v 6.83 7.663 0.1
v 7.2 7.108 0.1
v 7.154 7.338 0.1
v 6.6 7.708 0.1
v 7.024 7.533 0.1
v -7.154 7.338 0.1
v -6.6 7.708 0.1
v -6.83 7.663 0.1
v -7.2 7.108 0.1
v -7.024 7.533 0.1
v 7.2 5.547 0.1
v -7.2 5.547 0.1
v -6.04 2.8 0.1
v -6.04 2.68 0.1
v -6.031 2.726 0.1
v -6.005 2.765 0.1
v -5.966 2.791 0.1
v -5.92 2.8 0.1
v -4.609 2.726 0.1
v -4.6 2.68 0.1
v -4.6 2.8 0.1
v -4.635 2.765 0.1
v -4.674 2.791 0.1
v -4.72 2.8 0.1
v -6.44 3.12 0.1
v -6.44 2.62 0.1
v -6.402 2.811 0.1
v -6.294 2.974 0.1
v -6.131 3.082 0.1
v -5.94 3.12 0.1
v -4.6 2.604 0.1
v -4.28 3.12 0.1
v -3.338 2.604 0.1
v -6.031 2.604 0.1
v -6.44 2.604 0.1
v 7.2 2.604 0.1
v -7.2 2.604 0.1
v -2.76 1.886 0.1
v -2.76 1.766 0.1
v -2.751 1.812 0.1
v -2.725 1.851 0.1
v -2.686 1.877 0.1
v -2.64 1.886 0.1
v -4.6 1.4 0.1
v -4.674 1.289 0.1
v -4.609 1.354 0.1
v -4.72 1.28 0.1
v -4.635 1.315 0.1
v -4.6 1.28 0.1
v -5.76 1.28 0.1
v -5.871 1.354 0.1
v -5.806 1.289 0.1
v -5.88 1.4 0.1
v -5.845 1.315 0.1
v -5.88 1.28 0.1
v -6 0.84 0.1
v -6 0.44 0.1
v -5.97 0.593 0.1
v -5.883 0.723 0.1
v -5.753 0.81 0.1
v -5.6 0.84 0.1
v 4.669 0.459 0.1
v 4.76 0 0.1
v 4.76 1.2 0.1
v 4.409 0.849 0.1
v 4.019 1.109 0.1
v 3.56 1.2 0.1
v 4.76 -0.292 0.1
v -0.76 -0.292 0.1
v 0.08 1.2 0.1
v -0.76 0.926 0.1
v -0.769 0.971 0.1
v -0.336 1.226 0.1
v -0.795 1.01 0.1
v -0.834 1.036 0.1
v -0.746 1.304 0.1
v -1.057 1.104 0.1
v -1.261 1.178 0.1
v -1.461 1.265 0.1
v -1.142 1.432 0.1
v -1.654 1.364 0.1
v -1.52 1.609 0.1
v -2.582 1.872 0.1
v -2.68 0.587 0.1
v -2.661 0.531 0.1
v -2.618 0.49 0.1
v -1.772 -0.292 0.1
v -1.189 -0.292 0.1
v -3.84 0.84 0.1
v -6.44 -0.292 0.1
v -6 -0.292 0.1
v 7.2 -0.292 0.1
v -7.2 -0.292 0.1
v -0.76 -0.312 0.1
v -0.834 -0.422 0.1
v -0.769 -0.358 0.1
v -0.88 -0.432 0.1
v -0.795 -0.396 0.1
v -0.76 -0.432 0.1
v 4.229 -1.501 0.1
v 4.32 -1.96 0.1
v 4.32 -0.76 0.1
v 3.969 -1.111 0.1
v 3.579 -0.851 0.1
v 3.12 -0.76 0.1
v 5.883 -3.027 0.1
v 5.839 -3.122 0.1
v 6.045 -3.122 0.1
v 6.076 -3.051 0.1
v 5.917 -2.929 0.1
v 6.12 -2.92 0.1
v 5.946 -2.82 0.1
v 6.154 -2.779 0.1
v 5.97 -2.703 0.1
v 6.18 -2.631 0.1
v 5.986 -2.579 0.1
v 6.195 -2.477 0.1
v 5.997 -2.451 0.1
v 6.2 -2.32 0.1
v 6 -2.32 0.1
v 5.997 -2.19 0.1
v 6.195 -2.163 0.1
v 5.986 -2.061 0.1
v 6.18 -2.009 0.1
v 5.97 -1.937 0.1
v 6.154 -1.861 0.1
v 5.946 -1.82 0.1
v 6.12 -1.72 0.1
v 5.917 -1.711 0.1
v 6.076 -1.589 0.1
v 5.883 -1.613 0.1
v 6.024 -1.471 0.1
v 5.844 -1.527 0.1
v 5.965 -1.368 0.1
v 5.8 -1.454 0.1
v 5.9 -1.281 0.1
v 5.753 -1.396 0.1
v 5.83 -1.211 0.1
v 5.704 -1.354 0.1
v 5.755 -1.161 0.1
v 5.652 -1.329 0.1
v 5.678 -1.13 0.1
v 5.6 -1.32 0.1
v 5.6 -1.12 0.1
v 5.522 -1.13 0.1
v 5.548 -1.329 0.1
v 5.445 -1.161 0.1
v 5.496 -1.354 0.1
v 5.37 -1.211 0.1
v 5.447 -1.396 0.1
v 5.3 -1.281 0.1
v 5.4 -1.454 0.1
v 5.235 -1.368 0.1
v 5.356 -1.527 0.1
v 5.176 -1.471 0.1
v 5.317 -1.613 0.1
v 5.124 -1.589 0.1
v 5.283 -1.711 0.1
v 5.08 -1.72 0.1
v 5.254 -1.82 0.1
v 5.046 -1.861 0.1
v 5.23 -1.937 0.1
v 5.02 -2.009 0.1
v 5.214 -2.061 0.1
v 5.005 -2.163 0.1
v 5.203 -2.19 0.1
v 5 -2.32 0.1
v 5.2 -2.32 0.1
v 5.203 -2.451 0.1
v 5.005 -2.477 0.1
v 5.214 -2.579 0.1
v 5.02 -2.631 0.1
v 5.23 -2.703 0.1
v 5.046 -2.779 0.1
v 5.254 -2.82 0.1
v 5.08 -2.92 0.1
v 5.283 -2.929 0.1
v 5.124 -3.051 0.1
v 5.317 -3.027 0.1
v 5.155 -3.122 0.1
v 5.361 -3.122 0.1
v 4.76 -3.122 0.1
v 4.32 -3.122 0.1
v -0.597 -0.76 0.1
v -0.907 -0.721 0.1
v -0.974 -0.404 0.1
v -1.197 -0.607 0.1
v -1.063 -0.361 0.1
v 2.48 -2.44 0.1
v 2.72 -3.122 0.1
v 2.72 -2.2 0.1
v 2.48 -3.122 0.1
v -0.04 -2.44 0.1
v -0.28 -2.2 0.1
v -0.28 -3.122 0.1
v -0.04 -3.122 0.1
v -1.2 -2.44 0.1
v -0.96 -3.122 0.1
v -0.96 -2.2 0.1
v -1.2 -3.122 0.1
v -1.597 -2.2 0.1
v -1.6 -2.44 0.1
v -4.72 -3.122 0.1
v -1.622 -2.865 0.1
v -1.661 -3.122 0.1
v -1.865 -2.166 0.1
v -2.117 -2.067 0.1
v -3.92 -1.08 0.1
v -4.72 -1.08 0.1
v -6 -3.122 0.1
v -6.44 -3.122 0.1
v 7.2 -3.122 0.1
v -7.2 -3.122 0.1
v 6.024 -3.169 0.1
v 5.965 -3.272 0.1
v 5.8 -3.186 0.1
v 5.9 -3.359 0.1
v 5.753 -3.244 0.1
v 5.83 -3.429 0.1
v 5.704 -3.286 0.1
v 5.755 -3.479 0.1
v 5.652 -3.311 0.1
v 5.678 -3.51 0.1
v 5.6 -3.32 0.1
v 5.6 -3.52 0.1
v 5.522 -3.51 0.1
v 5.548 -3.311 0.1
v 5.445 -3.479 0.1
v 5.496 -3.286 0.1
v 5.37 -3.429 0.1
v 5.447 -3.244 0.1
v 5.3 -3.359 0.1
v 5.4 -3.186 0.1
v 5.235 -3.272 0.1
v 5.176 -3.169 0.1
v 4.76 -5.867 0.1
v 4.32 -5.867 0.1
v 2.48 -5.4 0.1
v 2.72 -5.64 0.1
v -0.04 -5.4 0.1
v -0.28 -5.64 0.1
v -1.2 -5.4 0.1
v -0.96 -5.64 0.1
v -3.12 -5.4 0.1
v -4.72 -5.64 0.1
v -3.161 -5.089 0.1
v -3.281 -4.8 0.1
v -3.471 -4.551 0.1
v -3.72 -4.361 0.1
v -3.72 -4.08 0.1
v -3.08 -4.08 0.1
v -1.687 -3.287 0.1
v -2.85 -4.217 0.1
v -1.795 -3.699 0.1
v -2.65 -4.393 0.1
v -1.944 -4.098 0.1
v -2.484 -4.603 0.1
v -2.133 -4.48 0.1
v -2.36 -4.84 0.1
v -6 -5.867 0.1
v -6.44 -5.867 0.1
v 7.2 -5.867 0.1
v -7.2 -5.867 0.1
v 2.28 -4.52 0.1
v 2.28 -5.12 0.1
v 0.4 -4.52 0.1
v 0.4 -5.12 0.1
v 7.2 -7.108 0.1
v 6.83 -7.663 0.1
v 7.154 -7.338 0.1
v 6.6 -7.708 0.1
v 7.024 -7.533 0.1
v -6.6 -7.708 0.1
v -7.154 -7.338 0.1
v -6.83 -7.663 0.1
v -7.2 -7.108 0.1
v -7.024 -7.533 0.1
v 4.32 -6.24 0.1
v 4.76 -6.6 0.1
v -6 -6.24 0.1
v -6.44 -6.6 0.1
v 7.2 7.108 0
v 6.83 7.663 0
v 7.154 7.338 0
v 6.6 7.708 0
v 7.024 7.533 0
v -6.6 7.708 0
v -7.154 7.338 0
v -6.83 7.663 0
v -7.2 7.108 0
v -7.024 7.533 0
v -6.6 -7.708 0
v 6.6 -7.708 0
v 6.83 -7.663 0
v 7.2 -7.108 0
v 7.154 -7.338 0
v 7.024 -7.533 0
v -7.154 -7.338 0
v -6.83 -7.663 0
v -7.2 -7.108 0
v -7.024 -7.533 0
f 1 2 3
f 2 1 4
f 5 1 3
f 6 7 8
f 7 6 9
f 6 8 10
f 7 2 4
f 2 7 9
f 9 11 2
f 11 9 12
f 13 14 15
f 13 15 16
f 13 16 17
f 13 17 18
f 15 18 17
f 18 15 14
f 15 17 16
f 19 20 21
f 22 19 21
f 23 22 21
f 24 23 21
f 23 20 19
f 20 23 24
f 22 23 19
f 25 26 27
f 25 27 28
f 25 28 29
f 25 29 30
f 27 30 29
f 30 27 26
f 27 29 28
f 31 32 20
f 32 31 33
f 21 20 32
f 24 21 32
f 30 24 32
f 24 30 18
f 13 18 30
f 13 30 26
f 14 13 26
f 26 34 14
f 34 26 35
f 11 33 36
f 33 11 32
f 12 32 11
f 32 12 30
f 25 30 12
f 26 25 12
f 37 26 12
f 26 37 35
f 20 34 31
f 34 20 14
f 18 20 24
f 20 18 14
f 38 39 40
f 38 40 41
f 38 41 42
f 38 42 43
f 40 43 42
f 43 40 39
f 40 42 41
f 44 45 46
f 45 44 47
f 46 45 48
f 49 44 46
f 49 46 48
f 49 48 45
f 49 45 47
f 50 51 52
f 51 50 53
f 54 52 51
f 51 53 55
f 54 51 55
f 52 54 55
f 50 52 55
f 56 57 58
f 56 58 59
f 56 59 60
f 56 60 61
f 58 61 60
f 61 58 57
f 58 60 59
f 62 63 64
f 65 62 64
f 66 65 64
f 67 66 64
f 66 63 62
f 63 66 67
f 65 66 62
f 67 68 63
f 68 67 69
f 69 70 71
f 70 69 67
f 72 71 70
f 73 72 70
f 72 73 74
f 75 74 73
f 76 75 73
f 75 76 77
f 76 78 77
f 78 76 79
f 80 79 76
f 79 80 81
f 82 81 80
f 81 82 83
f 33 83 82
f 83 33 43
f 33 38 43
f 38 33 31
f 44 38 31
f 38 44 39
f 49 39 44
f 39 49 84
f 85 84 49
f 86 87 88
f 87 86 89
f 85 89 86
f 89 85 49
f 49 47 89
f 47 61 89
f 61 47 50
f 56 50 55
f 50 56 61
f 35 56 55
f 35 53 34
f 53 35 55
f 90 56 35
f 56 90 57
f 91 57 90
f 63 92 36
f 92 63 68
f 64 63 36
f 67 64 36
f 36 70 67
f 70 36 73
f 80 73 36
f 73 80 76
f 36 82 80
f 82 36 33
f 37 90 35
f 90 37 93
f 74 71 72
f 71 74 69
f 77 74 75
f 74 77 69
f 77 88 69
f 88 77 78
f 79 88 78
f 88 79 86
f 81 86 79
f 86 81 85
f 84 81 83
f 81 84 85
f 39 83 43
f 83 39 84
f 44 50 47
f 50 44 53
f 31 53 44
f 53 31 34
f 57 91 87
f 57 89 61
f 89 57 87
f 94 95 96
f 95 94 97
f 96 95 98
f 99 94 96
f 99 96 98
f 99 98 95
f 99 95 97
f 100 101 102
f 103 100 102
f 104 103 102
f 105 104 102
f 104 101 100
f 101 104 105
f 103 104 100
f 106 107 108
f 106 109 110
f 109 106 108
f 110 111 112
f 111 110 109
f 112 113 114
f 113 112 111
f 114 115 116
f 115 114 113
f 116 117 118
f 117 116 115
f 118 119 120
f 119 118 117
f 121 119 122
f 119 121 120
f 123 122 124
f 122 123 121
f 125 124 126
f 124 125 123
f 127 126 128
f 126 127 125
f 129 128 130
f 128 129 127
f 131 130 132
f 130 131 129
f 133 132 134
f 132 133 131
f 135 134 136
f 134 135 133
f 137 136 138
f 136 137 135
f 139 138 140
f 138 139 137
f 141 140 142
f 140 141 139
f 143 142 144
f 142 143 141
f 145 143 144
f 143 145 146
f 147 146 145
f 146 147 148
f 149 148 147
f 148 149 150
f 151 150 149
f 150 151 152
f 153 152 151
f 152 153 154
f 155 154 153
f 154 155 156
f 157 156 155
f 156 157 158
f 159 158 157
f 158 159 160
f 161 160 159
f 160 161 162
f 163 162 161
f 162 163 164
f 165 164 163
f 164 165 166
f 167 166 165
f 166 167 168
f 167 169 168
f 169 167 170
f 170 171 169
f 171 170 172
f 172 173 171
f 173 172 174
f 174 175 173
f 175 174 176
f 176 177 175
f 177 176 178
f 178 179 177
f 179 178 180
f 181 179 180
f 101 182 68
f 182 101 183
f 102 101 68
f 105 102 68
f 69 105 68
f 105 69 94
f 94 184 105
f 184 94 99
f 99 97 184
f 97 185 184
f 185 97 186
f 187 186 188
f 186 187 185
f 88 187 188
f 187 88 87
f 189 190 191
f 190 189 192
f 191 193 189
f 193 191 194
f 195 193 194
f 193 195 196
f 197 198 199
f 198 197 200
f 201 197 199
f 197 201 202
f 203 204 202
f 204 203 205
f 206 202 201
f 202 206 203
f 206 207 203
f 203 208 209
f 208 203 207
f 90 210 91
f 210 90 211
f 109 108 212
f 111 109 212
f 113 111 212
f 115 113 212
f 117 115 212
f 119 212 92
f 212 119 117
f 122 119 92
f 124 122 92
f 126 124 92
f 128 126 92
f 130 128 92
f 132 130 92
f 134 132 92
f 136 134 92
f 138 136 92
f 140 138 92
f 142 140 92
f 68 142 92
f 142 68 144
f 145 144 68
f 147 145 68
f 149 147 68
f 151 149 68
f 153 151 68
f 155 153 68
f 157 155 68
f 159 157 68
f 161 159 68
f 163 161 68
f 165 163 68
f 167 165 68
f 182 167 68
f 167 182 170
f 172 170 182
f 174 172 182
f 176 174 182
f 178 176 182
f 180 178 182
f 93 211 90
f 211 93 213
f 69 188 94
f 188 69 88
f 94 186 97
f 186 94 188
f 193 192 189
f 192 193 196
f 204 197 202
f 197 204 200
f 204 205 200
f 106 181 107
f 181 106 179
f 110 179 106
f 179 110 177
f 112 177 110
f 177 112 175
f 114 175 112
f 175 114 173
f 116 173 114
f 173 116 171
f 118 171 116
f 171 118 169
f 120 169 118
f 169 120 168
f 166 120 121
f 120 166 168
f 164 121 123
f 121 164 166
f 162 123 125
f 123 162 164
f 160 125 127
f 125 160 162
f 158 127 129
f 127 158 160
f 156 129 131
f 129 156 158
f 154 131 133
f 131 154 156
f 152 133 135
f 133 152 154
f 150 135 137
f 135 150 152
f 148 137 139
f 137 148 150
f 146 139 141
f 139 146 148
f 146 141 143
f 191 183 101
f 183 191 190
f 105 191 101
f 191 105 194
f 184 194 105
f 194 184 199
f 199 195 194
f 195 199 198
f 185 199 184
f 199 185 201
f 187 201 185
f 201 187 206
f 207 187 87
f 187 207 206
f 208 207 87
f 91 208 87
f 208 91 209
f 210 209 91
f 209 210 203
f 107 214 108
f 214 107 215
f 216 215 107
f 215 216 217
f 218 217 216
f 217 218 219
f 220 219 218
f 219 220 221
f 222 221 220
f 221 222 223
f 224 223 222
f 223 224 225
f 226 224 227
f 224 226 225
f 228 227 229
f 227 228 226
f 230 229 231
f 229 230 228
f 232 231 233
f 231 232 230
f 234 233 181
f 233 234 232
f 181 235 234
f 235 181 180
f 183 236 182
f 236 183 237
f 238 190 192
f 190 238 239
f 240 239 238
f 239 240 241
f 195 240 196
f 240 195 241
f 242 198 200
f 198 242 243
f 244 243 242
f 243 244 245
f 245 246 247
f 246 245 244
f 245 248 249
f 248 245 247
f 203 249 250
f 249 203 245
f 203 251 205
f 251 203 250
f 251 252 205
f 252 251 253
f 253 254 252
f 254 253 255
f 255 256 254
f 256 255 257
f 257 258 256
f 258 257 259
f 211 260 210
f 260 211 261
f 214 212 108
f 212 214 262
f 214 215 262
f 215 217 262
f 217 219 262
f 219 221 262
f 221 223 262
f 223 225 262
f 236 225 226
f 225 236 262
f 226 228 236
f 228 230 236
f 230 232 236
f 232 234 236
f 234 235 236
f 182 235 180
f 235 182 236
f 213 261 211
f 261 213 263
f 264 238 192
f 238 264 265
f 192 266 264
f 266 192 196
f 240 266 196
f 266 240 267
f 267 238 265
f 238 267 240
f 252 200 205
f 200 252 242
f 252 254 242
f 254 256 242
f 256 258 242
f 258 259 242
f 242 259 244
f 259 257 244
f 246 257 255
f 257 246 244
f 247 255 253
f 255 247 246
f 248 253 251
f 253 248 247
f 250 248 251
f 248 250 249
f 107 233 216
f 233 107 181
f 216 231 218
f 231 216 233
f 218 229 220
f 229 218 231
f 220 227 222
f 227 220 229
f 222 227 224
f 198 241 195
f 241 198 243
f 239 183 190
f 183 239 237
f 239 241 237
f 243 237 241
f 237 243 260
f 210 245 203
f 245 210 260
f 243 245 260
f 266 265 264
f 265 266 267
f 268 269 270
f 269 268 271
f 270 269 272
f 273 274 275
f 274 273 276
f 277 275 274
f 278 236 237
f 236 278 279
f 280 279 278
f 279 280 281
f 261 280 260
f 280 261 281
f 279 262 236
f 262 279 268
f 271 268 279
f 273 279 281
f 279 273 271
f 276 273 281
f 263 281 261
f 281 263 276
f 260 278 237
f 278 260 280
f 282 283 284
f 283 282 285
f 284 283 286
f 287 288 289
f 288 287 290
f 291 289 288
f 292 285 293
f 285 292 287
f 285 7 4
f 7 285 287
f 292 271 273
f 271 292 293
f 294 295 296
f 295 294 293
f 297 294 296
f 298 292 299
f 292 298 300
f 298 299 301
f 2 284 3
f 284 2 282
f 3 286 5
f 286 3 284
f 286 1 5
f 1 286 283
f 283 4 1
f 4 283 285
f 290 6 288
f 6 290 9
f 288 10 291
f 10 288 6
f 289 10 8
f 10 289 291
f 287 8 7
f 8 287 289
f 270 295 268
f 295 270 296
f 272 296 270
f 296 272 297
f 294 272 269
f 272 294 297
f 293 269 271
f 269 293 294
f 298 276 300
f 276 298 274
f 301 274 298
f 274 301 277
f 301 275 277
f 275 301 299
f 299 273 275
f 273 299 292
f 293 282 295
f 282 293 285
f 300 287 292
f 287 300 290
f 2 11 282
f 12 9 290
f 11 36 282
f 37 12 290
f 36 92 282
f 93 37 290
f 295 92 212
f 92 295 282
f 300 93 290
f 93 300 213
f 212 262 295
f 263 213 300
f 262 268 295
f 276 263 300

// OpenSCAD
use <../lib.scad>
use <6141875r.scad>
function ldraw_lib__6141875s() = [
// 0 Sticker  1.9 x  1.8 with Taillamp on Blue Background Right
// 0 Name: 6141875s.dat
// 0 Author: Massimo Maso [Sirio]
// 0 !LDRAW_ORG Part UPDATE 2023-04
// 0 !LICENSE Licensed under CC BY 4.0 : see CAreadme.txt
// 
// 0 BFC CERTIFY CCW
  [0,"BFC","CERTIFY"],
  [0,"BFC","CCW"],
// 
// 0 !KEYWORDS Bricklink 75875stk01, Brickowl 53567, F-150, Ford, Raptor
// 0 !KEYWORDS Rebrickable 24760, Set 75875, Speed Champions
// 
// 0 !HISTORY 2023-08-25 [OrionP] Official Update 2023-04
// 
// 
// 1 16 0 0 0 -1 0 0 0 1 0 0 0 1 6141875r.dat
  [1,16,0,0,0,-1,0,0,0,1,0,0,0,1, ldraw_lib__6141875r()],
];
module ldraw_lib__6141875s(step=0, col=false, unit=2/5, alt=false, line=0.2, solid=!$preview)
    makepoly(ldraw_lib__6141875s(), step=step, col=col, unit=unit, alt=alt, line=line, solid=solid);
ldraw_lib__6141875s(line=0.2);
